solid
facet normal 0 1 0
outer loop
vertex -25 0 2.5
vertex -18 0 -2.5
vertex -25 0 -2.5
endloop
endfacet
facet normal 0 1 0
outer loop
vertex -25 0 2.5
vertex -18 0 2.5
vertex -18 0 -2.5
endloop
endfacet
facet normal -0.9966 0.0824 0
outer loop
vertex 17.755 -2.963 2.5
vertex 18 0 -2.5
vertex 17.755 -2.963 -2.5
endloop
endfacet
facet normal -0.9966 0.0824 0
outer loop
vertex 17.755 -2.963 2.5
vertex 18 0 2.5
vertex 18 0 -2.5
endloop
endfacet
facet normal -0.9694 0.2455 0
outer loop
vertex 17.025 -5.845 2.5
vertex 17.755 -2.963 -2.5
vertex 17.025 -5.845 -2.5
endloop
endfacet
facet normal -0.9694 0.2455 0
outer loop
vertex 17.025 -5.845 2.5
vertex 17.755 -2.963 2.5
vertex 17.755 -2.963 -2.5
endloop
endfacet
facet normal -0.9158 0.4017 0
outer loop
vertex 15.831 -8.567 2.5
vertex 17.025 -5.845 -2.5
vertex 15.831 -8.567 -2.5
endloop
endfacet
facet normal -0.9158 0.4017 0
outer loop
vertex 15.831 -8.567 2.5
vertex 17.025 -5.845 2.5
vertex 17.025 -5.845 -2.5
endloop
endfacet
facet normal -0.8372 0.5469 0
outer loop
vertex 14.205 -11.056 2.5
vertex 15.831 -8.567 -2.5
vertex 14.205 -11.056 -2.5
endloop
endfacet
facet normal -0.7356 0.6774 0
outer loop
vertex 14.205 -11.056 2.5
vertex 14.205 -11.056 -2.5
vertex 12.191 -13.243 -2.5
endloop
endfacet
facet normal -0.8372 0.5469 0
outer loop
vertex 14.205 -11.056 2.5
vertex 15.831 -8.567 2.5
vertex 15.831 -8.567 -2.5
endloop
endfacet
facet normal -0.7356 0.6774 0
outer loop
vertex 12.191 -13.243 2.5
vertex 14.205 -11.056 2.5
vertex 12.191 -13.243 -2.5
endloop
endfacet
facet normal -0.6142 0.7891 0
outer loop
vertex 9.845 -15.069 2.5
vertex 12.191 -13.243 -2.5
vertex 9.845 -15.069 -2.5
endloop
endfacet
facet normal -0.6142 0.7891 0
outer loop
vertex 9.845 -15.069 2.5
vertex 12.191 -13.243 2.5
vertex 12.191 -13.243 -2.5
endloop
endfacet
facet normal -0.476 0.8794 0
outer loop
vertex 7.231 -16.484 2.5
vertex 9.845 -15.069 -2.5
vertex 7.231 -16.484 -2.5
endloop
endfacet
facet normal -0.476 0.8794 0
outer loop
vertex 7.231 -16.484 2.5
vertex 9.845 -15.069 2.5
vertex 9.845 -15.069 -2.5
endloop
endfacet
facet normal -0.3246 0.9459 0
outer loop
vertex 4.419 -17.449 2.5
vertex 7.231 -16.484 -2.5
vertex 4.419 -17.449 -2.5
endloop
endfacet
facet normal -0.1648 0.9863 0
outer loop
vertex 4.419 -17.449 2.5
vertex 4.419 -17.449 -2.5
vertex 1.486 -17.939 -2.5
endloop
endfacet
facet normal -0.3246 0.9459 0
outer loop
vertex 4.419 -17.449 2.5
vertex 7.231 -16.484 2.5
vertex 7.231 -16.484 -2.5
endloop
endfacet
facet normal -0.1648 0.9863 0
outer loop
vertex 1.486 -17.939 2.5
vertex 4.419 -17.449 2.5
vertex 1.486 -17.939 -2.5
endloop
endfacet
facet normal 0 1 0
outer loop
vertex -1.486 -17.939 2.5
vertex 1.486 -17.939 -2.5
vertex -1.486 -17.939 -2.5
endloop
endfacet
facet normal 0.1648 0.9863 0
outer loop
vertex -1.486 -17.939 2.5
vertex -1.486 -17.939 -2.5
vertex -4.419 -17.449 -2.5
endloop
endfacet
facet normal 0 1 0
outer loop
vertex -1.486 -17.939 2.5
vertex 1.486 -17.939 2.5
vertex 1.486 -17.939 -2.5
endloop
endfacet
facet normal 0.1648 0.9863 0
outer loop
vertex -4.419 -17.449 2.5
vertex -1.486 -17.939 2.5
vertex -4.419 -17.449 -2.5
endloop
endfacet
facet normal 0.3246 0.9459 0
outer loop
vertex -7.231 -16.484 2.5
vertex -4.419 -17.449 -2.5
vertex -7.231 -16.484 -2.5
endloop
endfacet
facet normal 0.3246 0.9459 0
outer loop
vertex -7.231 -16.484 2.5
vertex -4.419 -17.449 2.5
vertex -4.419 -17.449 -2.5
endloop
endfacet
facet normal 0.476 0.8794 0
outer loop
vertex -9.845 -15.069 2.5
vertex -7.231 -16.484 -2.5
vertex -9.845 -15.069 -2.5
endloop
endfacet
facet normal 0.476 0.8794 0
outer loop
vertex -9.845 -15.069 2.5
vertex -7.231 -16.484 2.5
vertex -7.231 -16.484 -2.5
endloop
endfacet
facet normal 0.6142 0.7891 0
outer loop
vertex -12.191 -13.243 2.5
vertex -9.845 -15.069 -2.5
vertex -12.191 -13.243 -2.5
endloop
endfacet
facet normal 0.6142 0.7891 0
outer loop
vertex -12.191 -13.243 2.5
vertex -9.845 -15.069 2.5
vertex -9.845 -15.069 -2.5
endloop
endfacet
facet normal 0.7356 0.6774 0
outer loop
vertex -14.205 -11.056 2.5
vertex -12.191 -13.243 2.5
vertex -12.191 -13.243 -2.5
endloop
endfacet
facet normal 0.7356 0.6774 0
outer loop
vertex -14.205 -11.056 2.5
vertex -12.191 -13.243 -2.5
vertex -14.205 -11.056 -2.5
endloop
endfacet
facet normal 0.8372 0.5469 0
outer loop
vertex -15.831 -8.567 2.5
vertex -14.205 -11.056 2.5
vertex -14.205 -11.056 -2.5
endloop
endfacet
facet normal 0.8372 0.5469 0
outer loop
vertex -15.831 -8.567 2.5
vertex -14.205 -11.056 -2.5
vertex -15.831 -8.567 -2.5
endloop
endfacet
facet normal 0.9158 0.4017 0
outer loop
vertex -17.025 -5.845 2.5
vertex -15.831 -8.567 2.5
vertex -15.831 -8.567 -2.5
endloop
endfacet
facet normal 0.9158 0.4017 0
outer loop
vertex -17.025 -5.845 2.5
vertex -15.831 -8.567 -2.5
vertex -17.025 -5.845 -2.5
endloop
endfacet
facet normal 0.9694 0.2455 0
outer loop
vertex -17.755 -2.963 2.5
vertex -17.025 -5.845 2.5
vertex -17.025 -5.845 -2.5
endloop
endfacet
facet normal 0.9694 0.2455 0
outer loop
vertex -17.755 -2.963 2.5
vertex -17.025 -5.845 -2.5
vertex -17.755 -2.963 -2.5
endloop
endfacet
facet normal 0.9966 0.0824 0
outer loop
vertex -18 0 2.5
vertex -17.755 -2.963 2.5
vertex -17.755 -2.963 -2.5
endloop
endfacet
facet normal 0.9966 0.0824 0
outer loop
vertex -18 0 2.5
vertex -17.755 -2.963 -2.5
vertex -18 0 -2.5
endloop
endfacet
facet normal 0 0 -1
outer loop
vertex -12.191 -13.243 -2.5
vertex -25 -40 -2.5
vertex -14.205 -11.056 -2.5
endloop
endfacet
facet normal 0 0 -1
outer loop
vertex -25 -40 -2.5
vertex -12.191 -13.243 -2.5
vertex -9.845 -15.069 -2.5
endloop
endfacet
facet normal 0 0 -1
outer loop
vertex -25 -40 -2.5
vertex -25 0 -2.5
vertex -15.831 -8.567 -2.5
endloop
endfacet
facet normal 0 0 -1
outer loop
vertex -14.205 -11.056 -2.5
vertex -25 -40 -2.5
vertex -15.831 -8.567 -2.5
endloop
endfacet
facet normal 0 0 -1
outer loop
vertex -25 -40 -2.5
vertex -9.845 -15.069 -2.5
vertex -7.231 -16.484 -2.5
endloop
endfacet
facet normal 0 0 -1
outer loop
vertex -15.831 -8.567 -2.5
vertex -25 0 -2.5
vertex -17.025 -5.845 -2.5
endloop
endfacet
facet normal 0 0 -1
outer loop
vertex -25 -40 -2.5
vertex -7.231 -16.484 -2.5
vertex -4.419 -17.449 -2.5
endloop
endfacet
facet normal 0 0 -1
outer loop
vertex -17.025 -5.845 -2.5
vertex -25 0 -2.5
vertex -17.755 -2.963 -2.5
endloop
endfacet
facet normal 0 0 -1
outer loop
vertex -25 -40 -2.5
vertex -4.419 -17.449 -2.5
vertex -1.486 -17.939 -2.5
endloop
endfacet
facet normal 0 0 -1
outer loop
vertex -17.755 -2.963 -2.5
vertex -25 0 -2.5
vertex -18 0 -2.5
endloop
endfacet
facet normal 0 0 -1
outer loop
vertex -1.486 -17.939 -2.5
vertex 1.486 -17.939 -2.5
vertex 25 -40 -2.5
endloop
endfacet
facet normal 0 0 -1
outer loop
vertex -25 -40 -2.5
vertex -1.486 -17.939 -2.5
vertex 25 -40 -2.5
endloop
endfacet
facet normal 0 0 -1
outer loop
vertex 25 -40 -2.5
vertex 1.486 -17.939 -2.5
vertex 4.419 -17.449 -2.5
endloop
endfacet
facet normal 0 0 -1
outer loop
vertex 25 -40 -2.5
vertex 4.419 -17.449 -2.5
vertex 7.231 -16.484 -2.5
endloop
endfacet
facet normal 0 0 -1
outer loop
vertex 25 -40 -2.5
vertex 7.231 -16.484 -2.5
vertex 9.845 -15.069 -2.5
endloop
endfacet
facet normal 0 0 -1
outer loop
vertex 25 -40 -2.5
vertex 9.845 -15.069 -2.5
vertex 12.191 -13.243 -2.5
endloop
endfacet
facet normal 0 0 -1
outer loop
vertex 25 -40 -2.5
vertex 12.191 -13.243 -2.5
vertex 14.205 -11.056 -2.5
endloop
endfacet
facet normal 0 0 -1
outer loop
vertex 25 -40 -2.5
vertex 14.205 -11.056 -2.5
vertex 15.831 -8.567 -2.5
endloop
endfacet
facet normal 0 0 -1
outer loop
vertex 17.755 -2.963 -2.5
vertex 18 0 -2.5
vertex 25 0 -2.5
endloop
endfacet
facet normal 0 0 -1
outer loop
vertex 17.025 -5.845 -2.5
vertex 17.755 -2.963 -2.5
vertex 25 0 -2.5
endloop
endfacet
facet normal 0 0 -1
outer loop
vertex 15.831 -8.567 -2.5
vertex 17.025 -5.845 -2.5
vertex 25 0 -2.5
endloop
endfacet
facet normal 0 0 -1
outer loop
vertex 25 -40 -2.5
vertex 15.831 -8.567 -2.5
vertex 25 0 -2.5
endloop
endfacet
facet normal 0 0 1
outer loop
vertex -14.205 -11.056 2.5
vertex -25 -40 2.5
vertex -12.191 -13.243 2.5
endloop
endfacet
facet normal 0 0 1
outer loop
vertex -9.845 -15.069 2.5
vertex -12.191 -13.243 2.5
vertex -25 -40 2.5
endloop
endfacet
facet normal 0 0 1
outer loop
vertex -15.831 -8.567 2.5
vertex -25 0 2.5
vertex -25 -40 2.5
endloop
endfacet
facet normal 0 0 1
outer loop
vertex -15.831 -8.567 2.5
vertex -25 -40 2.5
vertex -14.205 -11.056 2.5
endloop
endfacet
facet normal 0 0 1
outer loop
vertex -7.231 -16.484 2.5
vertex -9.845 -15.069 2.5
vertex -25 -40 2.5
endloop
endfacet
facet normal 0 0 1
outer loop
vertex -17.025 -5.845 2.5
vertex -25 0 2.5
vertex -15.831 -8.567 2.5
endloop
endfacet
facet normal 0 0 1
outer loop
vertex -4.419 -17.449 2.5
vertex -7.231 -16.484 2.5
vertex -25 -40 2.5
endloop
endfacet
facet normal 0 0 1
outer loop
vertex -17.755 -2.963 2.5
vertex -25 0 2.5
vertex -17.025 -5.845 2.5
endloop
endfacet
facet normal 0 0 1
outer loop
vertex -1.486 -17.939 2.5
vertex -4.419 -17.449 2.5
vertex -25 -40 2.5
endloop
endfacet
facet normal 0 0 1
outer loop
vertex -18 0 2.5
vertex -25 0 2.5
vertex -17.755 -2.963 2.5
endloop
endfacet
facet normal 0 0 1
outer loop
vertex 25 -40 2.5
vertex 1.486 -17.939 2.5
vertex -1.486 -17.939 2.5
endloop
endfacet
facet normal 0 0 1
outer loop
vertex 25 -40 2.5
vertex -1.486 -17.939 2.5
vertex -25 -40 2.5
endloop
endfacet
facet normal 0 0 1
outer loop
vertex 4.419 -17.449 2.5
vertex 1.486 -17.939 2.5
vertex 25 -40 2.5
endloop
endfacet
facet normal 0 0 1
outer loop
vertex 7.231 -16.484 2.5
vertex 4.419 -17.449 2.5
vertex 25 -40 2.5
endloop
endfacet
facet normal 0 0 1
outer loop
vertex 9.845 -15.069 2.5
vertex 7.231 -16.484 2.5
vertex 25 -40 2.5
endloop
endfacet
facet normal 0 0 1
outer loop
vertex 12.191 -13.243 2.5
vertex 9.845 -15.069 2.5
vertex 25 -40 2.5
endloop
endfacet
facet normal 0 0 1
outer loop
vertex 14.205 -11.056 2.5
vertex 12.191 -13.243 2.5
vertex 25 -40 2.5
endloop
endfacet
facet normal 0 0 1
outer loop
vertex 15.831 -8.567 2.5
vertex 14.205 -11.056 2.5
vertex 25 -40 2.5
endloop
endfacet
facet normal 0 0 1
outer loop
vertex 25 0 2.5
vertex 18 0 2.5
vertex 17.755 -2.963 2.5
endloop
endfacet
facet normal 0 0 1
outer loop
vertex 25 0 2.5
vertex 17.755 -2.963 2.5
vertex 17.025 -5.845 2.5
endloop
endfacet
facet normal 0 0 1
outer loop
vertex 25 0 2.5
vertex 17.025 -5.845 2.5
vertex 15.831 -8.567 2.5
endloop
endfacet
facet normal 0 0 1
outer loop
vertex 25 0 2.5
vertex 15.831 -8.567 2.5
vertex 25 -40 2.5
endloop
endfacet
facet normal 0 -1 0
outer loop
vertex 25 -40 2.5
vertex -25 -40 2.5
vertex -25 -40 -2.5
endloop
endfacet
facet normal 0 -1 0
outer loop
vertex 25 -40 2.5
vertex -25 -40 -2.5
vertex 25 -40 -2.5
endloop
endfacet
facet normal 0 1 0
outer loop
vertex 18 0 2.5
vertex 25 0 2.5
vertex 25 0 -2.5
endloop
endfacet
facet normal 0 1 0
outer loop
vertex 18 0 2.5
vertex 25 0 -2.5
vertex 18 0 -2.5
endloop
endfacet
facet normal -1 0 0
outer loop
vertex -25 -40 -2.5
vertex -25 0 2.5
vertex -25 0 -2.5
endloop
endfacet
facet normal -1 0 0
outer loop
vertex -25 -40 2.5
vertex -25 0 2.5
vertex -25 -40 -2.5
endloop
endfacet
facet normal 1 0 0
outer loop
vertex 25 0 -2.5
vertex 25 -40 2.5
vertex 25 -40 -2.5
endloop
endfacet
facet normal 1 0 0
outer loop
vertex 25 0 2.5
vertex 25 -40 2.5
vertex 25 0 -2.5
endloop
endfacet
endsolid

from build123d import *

# Parameters (mm, degrees)
BOSS_EXTRUDE1_DEPTH = 2.5


with BuildPart() as part:
    # Sketch1 → Boss-Extrude1 (new, symmetric)
    with BuildSketch(Plane.XY):
        with BuildLine():
            Line((-25, 0), (-25, -40))
            Line((-25, -40), (25, -40))
            Line((25, -40), (25, 0))
            Line((25, 0), (18, 0))
            ThreePointArc((18, 0), (0, -18), (-18, 0))
            Line((-18, 0), (-25, 0))
        make_face()
    extrude(amount=BOSS_EXTRUDE1_DEPTH, both=True)


solid = part.part
